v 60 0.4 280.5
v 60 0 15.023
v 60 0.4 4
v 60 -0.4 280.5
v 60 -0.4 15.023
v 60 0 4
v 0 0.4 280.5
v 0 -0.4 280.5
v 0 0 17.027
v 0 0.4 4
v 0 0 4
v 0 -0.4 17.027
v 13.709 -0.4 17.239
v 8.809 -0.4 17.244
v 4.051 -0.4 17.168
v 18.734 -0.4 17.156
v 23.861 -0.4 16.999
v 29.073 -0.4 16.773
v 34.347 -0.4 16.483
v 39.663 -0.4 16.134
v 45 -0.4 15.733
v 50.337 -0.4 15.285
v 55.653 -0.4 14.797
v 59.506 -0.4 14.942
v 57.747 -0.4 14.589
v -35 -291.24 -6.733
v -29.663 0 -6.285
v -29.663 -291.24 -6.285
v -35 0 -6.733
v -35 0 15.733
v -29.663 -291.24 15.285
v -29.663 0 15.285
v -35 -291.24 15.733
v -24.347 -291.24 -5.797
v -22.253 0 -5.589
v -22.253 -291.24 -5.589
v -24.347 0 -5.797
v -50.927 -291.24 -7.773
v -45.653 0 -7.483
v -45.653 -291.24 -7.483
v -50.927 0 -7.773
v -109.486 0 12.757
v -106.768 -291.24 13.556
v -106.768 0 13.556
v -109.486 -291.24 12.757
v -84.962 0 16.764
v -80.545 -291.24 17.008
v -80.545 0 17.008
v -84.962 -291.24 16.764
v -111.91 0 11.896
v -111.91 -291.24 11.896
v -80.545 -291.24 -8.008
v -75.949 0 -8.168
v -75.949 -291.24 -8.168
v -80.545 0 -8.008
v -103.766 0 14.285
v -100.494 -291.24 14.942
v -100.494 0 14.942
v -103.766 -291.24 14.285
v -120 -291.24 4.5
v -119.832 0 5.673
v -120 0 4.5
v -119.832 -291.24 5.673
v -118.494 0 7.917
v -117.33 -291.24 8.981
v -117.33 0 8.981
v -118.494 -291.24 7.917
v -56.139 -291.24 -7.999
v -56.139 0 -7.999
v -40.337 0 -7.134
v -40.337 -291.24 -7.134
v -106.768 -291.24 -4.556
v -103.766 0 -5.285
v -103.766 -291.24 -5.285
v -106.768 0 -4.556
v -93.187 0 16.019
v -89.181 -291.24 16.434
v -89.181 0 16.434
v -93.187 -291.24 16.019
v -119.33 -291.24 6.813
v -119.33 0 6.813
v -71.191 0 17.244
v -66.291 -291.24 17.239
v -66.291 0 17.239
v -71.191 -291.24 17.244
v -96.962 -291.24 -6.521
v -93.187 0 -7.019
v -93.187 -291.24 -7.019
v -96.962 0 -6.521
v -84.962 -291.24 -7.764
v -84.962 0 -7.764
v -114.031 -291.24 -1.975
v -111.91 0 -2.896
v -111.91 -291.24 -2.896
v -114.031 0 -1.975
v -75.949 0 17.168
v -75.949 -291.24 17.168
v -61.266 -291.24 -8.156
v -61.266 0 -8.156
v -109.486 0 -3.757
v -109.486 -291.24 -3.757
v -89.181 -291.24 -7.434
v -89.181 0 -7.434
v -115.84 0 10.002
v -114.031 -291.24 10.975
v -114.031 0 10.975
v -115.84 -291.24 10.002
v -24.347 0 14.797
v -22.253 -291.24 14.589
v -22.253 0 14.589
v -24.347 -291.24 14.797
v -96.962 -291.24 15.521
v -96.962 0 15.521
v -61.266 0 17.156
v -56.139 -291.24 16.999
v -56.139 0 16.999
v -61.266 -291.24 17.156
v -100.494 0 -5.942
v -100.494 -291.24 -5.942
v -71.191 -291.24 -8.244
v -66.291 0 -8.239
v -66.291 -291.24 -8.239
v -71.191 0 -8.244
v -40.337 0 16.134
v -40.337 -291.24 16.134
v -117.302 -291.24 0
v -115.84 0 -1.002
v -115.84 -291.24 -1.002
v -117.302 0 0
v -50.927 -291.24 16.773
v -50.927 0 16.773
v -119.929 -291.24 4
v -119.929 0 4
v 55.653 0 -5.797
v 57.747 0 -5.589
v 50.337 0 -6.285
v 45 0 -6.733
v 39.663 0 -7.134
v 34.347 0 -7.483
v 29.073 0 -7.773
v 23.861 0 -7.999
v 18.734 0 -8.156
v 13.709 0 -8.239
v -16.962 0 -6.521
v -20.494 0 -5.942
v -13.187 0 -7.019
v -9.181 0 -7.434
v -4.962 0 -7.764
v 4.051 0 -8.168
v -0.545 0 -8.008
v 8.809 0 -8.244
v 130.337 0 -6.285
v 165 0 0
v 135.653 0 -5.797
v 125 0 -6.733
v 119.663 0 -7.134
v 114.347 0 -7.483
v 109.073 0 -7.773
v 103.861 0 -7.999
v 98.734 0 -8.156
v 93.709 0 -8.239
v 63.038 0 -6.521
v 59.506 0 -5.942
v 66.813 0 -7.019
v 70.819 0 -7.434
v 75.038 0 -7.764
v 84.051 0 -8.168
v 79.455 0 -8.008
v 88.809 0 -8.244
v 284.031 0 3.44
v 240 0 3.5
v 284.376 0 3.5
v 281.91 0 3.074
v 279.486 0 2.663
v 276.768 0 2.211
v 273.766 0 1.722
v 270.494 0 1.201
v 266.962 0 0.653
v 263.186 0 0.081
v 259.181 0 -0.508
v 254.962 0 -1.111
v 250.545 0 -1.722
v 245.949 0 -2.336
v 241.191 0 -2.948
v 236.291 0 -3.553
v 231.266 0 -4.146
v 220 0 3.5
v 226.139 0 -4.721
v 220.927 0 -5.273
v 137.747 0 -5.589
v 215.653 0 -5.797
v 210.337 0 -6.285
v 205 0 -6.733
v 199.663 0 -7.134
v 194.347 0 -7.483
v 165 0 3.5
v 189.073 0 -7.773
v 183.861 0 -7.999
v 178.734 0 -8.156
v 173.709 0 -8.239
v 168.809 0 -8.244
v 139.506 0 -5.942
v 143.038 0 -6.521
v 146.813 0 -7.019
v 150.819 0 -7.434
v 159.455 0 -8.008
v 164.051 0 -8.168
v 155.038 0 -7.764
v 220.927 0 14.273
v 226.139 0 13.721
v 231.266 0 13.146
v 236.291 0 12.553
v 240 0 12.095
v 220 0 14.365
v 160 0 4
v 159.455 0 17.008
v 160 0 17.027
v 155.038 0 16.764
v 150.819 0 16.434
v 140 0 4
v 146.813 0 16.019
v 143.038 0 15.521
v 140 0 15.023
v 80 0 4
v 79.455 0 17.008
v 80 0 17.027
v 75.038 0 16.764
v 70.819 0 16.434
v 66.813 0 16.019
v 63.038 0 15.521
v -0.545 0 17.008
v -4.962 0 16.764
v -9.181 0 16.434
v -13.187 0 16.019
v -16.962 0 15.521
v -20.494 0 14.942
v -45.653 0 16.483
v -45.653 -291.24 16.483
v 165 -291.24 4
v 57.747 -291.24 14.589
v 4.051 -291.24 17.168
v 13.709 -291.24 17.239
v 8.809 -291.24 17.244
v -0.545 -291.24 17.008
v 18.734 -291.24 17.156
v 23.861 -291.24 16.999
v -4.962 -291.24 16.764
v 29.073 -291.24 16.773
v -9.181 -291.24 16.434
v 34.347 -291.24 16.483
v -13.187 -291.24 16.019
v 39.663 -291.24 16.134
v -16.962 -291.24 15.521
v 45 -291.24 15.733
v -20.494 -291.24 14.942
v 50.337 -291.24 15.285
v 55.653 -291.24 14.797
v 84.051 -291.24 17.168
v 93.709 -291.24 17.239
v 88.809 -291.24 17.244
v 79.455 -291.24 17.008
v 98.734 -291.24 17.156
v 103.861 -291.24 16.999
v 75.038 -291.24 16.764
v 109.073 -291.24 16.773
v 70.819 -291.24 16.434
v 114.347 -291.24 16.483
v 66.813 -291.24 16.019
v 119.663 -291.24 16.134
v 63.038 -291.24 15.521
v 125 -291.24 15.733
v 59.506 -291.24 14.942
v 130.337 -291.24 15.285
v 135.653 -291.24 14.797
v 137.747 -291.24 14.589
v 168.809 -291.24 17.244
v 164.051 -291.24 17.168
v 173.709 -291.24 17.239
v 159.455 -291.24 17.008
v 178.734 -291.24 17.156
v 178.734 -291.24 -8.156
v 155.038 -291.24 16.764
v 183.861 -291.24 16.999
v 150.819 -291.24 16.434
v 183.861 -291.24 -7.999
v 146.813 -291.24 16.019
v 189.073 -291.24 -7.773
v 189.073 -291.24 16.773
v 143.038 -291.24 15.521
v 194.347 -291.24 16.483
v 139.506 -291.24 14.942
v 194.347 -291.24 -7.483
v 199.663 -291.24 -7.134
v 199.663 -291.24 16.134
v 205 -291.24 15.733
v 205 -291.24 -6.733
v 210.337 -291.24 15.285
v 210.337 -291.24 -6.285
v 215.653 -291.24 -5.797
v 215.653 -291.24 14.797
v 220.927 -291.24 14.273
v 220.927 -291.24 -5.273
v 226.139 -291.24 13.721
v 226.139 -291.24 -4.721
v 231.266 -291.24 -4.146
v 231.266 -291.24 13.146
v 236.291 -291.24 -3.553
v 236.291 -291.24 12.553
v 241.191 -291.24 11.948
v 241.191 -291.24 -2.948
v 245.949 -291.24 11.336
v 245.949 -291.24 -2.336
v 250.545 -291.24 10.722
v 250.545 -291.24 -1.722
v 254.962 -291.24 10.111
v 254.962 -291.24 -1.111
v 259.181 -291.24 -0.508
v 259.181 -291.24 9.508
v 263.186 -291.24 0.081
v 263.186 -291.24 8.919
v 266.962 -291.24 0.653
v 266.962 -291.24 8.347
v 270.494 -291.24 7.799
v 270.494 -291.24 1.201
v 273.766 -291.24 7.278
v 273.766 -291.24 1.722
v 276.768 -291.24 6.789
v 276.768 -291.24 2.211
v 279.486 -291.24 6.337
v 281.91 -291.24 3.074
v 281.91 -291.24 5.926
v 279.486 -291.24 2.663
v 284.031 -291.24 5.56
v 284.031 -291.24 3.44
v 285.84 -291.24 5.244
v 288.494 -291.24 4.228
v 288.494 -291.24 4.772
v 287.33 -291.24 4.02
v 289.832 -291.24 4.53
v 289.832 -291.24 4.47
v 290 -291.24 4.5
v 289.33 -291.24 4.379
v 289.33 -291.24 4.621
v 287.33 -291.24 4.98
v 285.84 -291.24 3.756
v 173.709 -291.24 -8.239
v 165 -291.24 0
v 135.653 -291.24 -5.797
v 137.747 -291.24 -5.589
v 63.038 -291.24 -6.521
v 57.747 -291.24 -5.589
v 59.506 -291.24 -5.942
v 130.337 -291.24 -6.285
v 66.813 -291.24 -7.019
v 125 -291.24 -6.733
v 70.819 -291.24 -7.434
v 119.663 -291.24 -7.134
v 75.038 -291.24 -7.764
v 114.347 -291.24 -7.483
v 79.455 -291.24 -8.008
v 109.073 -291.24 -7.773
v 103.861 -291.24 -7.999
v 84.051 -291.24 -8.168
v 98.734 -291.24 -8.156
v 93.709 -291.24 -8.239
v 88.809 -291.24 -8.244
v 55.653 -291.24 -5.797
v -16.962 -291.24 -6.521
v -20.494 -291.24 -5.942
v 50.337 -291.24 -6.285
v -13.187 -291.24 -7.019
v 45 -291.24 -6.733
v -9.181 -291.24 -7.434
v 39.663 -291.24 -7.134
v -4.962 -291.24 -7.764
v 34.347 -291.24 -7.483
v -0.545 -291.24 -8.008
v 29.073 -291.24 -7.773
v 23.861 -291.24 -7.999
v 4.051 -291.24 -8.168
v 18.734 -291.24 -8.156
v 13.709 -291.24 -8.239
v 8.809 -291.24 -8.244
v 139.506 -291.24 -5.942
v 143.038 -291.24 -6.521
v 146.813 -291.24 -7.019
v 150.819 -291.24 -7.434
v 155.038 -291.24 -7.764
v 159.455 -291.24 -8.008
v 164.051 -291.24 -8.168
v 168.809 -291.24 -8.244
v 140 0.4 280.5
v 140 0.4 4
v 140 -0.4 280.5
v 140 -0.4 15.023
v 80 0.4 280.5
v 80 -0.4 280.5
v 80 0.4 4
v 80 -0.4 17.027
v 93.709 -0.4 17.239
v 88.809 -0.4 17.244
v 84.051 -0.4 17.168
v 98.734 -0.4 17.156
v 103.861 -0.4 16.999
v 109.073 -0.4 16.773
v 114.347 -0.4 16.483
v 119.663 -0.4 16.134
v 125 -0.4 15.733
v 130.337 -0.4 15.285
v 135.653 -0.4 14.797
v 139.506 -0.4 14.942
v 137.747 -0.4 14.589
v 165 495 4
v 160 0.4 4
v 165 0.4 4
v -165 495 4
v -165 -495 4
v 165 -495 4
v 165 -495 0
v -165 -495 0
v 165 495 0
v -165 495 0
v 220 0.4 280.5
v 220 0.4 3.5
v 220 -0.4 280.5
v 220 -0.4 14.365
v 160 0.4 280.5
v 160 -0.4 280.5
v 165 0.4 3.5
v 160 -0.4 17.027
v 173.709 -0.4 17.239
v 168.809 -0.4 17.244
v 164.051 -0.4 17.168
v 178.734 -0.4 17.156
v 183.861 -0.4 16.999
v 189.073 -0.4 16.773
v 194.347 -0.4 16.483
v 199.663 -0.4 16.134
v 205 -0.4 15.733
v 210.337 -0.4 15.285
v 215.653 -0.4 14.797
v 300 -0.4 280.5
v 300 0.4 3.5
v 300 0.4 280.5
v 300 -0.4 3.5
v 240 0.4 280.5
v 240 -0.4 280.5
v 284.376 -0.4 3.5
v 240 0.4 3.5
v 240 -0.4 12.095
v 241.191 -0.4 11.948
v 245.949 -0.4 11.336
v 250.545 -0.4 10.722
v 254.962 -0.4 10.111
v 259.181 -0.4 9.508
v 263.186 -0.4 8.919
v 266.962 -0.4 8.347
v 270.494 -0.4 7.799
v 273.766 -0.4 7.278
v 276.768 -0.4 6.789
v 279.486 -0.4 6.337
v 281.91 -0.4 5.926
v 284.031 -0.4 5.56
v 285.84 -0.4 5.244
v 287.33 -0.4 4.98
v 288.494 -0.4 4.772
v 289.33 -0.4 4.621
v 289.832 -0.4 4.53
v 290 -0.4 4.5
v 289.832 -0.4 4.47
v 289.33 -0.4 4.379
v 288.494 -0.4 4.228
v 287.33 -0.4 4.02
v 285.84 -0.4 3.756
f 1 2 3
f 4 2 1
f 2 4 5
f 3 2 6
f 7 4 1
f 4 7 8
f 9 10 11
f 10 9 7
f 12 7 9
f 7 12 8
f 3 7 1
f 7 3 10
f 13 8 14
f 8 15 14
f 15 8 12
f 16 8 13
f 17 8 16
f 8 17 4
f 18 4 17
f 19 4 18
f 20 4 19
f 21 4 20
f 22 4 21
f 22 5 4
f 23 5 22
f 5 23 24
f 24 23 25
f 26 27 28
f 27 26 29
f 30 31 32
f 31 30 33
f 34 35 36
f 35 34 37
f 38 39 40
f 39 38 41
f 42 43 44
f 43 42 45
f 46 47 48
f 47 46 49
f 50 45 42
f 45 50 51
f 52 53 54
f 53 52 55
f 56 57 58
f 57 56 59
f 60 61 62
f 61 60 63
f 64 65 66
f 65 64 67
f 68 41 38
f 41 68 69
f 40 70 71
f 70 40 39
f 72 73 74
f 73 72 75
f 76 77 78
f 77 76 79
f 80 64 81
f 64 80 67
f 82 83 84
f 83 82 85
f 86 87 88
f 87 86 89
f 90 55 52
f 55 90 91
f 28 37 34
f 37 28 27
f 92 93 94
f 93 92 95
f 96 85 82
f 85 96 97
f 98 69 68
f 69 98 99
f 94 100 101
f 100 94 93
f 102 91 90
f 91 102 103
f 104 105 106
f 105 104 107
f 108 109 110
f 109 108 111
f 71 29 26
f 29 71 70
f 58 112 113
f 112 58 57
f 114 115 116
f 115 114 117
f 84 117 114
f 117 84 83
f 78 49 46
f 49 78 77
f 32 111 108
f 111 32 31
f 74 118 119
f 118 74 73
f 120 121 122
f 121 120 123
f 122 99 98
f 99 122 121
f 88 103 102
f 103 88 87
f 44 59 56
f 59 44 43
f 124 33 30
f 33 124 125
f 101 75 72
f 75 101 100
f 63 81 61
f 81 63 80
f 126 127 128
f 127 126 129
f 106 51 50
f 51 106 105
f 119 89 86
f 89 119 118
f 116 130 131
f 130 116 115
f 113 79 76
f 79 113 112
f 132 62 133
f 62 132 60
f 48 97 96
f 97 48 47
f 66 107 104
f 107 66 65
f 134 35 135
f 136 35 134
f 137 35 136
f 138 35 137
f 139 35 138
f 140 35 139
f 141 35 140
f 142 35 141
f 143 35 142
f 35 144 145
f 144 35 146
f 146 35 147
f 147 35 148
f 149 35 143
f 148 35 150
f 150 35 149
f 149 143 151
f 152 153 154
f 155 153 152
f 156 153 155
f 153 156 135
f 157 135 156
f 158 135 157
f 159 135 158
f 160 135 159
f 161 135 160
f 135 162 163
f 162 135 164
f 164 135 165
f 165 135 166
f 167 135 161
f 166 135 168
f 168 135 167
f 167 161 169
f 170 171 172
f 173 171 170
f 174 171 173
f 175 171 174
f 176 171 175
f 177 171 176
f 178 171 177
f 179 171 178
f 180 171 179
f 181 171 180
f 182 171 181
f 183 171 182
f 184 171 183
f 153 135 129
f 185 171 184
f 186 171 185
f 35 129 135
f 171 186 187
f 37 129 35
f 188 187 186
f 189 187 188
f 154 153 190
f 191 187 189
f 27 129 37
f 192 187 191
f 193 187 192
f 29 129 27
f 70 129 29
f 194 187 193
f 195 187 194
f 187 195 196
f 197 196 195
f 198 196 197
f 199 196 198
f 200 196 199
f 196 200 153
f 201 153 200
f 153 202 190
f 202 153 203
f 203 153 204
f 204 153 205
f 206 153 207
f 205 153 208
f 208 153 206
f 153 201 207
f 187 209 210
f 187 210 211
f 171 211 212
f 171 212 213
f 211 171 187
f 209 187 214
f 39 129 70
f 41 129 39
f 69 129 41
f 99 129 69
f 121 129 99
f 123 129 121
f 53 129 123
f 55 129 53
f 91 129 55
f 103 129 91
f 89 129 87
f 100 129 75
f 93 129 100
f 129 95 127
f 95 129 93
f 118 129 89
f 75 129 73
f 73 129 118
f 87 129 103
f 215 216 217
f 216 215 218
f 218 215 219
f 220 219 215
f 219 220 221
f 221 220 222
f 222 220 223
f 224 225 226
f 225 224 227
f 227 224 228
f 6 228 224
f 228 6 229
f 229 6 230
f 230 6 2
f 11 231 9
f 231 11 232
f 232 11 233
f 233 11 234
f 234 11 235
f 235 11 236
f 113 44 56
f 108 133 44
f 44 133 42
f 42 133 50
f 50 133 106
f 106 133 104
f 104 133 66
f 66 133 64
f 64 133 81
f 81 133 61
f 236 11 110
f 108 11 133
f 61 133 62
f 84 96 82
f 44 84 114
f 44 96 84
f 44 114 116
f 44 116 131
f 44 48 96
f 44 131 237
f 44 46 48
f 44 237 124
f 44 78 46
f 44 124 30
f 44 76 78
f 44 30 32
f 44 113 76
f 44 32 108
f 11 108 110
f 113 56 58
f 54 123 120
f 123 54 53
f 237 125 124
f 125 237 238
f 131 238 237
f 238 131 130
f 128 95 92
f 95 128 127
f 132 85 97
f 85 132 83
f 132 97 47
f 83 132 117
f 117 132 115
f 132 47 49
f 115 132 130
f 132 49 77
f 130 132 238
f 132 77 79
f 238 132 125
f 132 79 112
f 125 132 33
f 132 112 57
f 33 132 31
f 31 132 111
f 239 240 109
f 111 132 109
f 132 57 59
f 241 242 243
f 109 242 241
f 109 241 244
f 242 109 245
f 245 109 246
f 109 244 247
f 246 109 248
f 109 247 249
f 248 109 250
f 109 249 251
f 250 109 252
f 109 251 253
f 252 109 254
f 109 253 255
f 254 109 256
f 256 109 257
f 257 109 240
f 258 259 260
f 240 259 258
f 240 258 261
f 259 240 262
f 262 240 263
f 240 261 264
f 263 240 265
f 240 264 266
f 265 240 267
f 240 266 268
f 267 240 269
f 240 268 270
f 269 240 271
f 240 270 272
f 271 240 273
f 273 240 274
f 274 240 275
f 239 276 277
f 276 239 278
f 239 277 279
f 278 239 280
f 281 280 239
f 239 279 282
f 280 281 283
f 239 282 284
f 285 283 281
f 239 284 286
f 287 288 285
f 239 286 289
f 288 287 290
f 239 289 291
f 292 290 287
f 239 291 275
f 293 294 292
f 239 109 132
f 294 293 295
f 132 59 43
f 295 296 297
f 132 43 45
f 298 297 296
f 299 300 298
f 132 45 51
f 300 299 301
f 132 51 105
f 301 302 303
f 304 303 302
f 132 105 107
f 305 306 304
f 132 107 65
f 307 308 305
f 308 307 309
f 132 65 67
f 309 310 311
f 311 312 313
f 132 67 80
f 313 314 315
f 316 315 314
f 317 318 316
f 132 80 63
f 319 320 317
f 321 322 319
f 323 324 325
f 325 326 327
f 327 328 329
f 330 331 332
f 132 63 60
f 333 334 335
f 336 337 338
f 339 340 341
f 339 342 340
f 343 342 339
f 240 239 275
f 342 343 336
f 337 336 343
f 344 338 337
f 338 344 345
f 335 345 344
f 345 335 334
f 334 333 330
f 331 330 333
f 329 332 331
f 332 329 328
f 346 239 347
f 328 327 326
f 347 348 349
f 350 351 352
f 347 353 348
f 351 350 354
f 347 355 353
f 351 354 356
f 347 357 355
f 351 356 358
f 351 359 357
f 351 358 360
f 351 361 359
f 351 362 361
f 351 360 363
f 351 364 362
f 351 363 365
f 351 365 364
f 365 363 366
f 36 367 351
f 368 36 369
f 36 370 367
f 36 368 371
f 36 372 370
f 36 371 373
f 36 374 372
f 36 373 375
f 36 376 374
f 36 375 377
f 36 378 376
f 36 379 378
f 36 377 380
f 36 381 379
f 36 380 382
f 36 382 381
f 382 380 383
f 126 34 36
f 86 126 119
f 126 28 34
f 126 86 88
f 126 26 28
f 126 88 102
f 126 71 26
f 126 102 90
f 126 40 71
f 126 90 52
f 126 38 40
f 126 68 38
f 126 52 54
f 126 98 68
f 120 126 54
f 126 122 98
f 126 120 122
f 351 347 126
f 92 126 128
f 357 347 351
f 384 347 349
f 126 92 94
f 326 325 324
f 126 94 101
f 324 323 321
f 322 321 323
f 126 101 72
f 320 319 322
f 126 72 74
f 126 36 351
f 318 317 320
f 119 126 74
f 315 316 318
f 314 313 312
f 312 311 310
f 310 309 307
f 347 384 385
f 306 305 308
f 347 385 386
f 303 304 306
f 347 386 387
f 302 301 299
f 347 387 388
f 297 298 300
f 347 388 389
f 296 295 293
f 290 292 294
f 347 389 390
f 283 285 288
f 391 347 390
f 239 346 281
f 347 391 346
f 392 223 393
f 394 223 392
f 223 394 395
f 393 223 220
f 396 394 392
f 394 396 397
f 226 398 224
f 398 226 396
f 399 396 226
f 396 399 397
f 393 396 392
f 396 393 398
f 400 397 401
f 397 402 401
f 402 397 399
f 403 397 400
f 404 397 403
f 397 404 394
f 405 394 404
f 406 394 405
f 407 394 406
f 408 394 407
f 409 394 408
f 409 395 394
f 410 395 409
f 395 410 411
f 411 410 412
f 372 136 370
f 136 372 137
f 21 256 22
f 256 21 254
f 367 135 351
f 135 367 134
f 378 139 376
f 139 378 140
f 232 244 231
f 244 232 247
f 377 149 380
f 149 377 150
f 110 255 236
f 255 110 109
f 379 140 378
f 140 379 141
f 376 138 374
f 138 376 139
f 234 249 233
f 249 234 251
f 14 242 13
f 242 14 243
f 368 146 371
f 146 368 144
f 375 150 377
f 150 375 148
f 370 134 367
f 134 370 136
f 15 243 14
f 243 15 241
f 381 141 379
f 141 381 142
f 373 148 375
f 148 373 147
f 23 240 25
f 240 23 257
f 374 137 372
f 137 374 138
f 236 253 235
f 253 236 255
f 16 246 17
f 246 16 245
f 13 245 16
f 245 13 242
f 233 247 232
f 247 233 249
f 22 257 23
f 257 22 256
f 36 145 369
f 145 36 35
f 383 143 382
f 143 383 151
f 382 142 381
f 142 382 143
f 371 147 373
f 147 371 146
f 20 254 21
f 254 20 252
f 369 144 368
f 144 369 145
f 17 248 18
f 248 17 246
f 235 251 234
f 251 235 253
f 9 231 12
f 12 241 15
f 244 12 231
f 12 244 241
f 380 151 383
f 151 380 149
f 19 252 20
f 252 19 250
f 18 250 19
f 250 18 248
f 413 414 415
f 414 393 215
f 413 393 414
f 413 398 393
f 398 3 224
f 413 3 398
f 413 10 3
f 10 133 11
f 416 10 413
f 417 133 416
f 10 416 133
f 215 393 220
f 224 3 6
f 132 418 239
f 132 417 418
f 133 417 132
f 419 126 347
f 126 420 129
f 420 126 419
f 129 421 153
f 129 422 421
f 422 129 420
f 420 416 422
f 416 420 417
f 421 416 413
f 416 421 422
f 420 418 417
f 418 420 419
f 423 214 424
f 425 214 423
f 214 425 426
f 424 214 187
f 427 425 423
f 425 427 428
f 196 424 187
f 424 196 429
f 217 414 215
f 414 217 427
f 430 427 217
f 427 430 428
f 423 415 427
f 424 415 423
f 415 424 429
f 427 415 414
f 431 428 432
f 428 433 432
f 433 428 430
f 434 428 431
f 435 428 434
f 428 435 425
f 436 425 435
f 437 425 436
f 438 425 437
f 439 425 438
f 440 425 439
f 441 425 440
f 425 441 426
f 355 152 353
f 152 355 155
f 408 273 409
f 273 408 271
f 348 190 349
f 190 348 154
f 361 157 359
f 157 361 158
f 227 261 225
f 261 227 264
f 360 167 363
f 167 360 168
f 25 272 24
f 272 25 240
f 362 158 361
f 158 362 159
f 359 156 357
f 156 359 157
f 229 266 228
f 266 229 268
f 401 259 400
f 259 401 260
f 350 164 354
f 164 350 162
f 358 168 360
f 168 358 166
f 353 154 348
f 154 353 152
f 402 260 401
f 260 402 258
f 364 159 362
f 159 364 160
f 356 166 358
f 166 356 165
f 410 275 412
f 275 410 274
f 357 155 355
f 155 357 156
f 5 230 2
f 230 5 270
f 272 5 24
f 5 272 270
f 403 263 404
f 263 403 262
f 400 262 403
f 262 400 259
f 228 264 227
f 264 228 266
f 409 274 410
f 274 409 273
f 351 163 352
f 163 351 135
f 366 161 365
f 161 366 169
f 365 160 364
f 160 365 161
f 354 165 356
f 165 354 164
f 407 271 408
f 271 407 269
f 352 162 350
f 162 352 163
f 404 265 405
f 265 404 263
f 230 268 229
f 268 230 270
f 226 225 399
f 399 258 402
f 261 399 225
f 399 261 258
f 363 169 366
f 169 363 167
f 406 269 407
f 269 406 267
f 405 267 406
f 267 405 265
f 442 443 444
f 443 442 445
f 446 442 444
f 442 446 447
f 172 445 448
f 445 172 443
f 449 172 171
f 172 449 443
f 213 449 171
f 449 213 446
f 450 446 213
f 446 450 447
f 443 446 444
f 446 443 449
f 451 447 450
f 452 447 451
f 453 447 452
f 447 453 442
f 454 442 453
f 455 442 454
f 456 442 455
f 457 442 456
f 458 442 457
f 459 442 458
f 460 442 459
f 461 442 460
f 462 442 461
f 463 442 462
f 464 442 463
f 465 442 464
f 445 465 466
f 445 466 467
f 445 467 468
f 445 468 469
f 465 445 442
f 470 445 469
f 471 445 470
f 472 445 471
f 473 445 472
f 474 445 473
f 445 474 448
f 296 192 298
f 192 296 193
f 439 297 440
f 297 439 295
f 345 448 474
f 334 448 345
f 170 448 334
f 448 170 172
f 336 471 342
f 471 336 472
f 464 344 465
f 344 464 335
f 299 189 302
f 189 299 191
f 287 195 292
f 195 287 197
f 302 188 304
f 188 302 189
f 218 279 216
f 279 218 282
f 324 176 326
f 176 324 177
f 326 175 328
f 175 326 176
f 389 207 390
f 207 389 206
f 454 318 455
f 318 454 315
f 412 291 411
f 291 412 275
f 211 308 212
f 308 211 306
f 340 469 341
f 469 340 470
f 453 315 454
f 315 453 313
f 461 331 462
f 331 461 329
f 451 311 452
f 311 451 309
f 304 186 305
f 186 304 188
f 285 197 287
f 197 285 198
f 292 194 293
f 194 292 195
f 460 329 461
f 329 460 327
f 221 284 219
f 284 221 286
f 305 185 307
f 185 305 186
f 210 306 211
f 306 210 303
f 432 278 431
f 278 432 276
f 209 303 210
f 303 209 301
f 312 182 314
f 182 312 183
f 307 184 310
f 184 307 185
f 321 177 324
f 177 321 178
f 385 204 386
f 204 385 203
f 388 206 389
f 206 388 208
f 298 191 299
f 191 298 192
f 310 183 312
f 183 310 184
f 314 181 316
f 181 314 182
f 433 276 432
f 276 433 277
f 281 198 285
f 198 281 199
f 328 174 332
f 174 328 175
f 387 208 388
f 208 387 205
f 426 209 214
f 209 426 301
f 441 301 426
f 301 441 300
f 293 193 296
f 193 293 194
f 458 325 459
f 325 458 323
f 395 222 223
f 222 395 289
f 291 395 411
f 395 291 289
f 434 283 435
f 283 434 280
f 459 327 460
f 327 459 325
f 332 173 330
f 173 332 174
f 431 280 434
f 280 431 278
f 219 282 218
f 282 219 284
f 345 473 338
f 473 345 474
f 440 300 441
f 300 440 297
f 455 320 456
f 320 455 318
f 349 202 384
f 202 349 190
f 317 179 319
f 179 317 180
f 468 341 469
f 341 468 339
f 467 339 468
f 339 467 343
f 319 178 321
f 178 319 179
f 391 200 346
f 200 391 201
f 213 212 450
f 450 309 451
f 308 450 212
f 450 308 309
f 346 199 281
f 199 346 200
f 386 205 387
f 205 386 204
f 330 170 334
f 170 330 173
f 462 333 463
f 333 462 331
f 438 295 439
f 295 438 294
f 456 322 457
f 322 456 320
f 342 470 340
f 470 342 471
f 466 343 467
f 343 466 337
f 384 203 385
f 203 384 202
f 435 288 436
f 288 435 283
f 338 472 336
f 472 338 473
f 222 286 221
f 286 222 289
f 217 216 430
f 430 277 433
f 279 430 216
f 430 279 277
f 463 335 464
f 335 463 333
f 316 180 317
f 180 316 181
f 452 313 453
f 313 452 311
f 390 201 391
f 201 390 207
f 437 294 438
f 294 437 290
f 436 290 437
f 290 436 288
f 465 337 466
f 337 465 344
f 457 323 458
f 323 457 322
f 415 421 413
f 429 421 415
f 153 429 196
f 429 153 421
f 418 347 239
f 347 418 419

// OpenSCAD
// file: ../666_1032.scad
draft = true;   // sets rendering quality to draft.
$fs = draft ? 5 : 0.5;
$fa = 10;

module 666_1032(draft){

    airfoil_thickness = 0030;
    depth = main_tube_outer_diameter*2;
    width = main_tube_outer_diameter + 2*(main_tube_outer_diameter/10);
    height = depth;

    beta = 90 - trailing_edge_angle(naca = airfoil_thickness); // calculate the angle of trailing edge
    trailing_wall= 1/(cos(beta)); //calculate lenght of wall cut relative to wall thickness
    echo(trailing_wall); // print a relative thickness of material at traling edge to wall thickness. 

    difference (){
union(){

    difference(){
    	airfoil(naca = airfoil_thickness, L = 170, N=101, h = height_of_vertical_tube + main_tube_outer_diameter/2 + 2*global_clearance + coupling_wall_thickness, open = false);
    	translate ([hull_wall_thickness,0,45])
            resize([170 - hull_wall_thickness - trailing_wall*hull_wall_thickness,(170*airfoil_thickness/100)- 2*hull_wall_thickness,210], auto=true) 
                airfoil(naca = airfoil_thickness, L = 170, N=101, h = height_of_vertical_tube + main_tube_outer_diameter/2 + 2*global_clearance, open = false);
    }
    //lem spodní a horní díl
    intersection(){
        difference(){
            union(){
                translate([0,-75,cover_pilon_division[1] - hull_wall_thickness])
                        cube([190,150,hull_wall_thickness]);
                translate([0,-75,cover_pilon_division[1]])
                        cube([190,150,hull_wall_thickness]);
        }

        translate ([ribbon_width,0,45])
            resize([170 - ribbon_width - trailing_wall*ribbon_width,(170*airfoil_thickness/100)- 2*ribbon_width,210], auto=true) 
                airfoil(naca = airfoil_thickness, L = 170, N=101, h = height_of_vertical_tube + main_tube_outer_diameter/2 + 2*global_clearance, open = false);
    //difference
    }
        airfoil(naca = airfoil_thickness, L = 170, N=101, h = height_of_vertical_tube + main_tube_outer_diameter/2 + 2*global_clearance + coupling_wall_thickness, open = false);
}
}
    	//pro otevření
    	translate ([120,- hull_wall_thickness/2,- 2*global_clearance])
    	   cube ([60,hull_wall_thickness,height_of_vertical_tube + 4*global_clearance]);

    	translate ([main_tube_outer_diameter + coupling_wall_thickness*2,-depth/2 - global_clearance,height_of_vertical_tube - main_tube_outer_diameter*2 - global_clearance/2 + main_tube_outer_diameter/2 + coupling_wall_thickness])
    	   cube ([width*5,depth + 2*global_clearance,height+global_clearance + main_tube_outer_diameter]);

        // hull shell from 666_1025.scad
        translate ([- cover_pilon_position,0,0])
            rotate ([90,0,0])
                drop(draft);
    //final difference
    }
//final module
}


//pro tisk

module 666_1032_A(draft){
        intersection(){
                666_1032(draft);
            translate([0,- 75,0])
                cube([180,150,cover_pilon_division[1]]);
        }
}

module 666_1032_B(draft){
    translate([0,0,20])
        intersection(){
                666_1032(draft);
            translate([0,- 75,cover_pilon_division[1]])
                cube([180,150,cover_pilon_division[2] - cover_pilon_division[1]]);
        }
}

//666_1032(draft);
666_1032_A(draft);
666_1032_B(draft);

use <./lib/naca4.scad>
include <../Parameters.scad>
use <666_1025.scad>
use <888_1000.scad>
// file: ../888_1000.scad
/*
// Nastavení zobrazení
$vpr = [338, 0, 357];
$vpt = [180, 25, -18];
$vpd = 1280;
*/
//improving rendering speed.
draft = true;   // sets rendering quality to draft.
$fs = draft ? 5 : 0.5;
$fa = 10;

/*
TODO: 

Přední díl obsahuje převis ve směru vybrání pro držák motoru. (U horního zámku)
Otvory pro šrouby v předním dílu jsou oválné, protože nejsou kolmo k rovině modelu.


*/




//vnitřní kapka
module hollowing_skeleton(shell_thickness = hull_wall_thickness, draft)
{

    beta = 90 - trailing_edge_angle(naca = hull_airfoil_thickness); // calculate the angle of trailing edge
    trailing_wall= 1/(cos(beta)); //calculate lenght of wall cut relative to wall thickness 

    intersection () {
    resize([hull_drop_length - shell_thickness - trailing_wall* shell_thickness, (hull_drop_length*hull_airfoil_thickness/100) - 2*shell_thickness, (hull_drop_length*hull_airfoil_thickness/100) - 2*shell_thickness], auto=true)
            rotate ([0,90,0])           
            rotate_extrude($fn = draft ? 50 : 100)
                rotate([0,0,90])
                    difference()
                    {
                      polygon(points = airfoil_data(naca=hull_airfoil_thickness, L = hull_drop_length, N=draft ? 50 : 200)); 
                      square(hull_drop_length); 
                    }
                    
      translate([0,0,hull_corner_radius])
        minkowski(){                   
            translate ([0,- hull_y_size , - hull_z_size/2 + shell_thickness])
                cube ([hull_x_size,2*hull_y_size - shell_thickness, hull_z_size - 2*shell_thickness - 2*hull_corner_radius]);
                rotate ([0,90,0])
                    cylinder (h = 1, r = hull_corner_radius, $fn = draft ? 50 : 100);                   
          }
                            
    }
}

module hollowing_skeleton_hem(ribbon_width, draft)
{

    beta = 90 - trailing_edge_angle(naca = hull_airfoil_thickness); // calculate the angle of trailing edge
    trailing_wall= 1/(cos(beta)); //calculate lenght of wall cut relative to wall thickness 

    intersection () {
    resize([hull_drop_length - ribbon_width - trailing_wall* ribbon_width, (hull_drop_length*hull_airfoil_thickness/100) - 2*ribbon_width, (hull_drop_length*hull_airfoil_thickness/100) - 2*ribbon_width], auto=true)
            rotate ([0,90,0])           
            rotate_extrude($fn = draft ? 50 : 100)
                rotate([0,0,90])
                    difference()
                    {
                      polygon(points = airfoil_data(naca=hull_airfoil_thickness, L = hull_drop_length, N=draft ? 50 : 200)); 
                      square(hull_drop_length); 
                    }
                    
      translate([0,0,hull_corner_radius])
        minkowski(){                   
            translate ([0,- hull_y_size, - hull_z_size/2 + ribbon_width])
                cube ([hull_x_size,2*hull_y_size - ribbon_width, hull_z_size - 2*ribbon_width - 2*hull_corner_radius]);
                rotate ([0,90,0])
                    cylinder (h = 1, r = hull_corner_radius, $fn = draft ? 50 : 100);                   
          }
                            
    }
}




//celá kapka
module drop(draft = true)
{

    beta = 90 - trailing_edge_angle(naca = hull_airfoil_thickness); // calculate the angle of trailing edge
    trailing_wall= 1/(cos(beta)); //calculate lenght of wall cut relative to wall thickness 

	intersection () {
    	rotate ([0,90,0])           
        	rotate_extrude($fn = draft ? 50 : 100)
                    rotate([0,0,90])
                        difference()
                        {
	                        polygon(points = airfoil_data(naca=hull_airfoil_thickness, L =hull_drop_length , N=draft ? 50 : 200)); 
    	                    square(hull_drop_length); 
        	            }
            		
        translate([0,0,hull_corner_radius])
          	minkowski(){                   
             	translate ([0,-hull_y_size,-hull_z_size/2])
             			cube ([hull_x_size, 2*hull_y_size,hull_z_size-2*hull_corner_radius]);
             	  	rotate ([0,90,0])
                 		cylinder (h = 1, r = hull_corner_radius, $fn = draft ? 50 : 100);                   
		    }
		    
	}
}


//základní kapka
module drop_skin(draft){

	difference(){
			drop();
		translate([hull_wall_thickness,0,0])
			hollowing_skeleton();
	}

}




drop_skin();














use <./lib/naca4.scad>
include <../Parameters.scad>
// file: ../666_1025.scad
use <./lib/naca4.scad>
include <../Parameters.scad>
use <666_1032.scad>


//Jen pro názornost
	//translate([180,0,0])
		//rotate ([-90,0,0])
			//666_1032();





module 666_1025(){

    beta = 90 - trailing_edge_angle(naca = hull_airfoil_thickness); // calculate the angle of trailing edge
    trailing_wall= 1/(cos(beta)); //calculate lenght of wall cut relative to wall thickness
    echo(trailing_wall); // print a relative thickness of material at traling edge to wall thickness.    

    difference(){
        intersection () {
            union(){
        		rotate ([0,90,0])           
                    rotate_extrude($fn = 100)
                        rotate([0,0,90])
                            difference()
                            {

                              polygon(points = airfoil_data(naca=hull_airfoil_thickness, L =hull_drop_length , N=100)); 
                              square(hull_drop_length); 
                            }

                // 666_1032 part holder
                translate([180,0,0]) 
                    rotate ([-90,0,0]) 
                        difference(){
                            
                            translate ([hull_wall_thickness,0,0])
                                resize([170 - hull_wall_thickness - trailing_wall*hull_wall_thickness,(170*0030/100)- 2*hull_wall_thickness,210], auto=true) 
                                    airfoil(naca = 0030, L = 170, N=101, h = 200, open = false);
                            translate ([2*hull_wall_thickness,0,0])       
                                resize([170 - hull_wall_thickness*2 - trailing_wall*hull_wall_thickness*2,(160*0030/100)- 2*hull_wall_thickness,210], auto=true) 
                                    airfoil(naca = 0030, L = 170, N=101, h = 200, open = false);
                            
                        }

            }
            minkowski(){                   
             	translate ([0,-(main_tube_outer_diameter/2)+1,-hull_z_size/2])
             		cube ([hull_x_size, hull_y_size,hull_z_size]);
             	
             		rotate ([0,90,0])
                 		cylinder (h = 1, r = hull_corner_radius, $fn = 100);                   

        	}

        }   

        //hollowing skeleton
    		translate ([hull_wall_thickness,0,0])
            	intersection () {
                    resize([hull_drop_length - hull_wall_thickness - trailing_wall* hull_wall_thickness, (hull_drop_length*hull_airfoil_thickness/100) - 2*hull_wall_thickness, (hull_drop_length*hull_airfoil_thickness/100) - 2*hull_wall_thickness], auto=true)
                 		rotate ([0,90,0])           
                            rotate_extrude($fn = 100)
                                rotate([0,0,90])
                                    difference()
                                    {

                                      polygon(points = airfoil_data(naca=hull_airfoil_thickness, L = hull_drop_length, N=200)); 
                                      square(hull_drop_length); 
                                    }
                 	minkowski(){                   
                     	translate ([0,-(main_tube_outer_diameter/2),-hull_z_size/2 + hull_wall_thickness])
                     		cube ([hull_x_size,hull_y_size - hull_wall_thickness, hull_z_size - 2*hull_wall_thickness]);
                     		rotate ([0,90,0])
                         		cylinder (h = 1, r = hull_corner_radius, $fn = 100);                   
            		}                   
            	}
            //for front part
    		translate ([-2,-1 - main_tube_outer_diameter/2,-25])
    				cube ([52,hull_y_size+10,50]);

        //for tube in back
    		translate ([hull_x_size-70,0,0])
    			rotate ([0,90,0])
    				cylinder (h = 80, r1 = main_tube_outer_diameter/2, r2 = main_tube_outer_diameter/2, $fn = 200);
    					    
        //for tube - propeller

			translate ([180+2*hull_wall_thickness,-10,0])       
				rotate ([-90,0,0])
                    resize([170 - hull_wall_thickness*2 - trailing_wall*hull_wall_thickness*2,(160*0030/100)- 2*hull_wall_thickness,210], auto=true) 
                        airfoil(naca = 0030, L = 170, N=101, h = 200, open = false);
        			
        //for printing
    		translate([0,-main_tube_outer_diameter/2-4.90,-170/2])
    			cube ([600,5,170]);

    		translate([hull_x_size-50,-main_tube_outer_diameter,-main_tube_outer_diameter/2])		
    			cube([80,main_tube_outer_diameter, main_tube_outer_diameter]);	

    }


}

    intersection(){
        666_1025();
        translate([0,-20,-150])                        
           cube([150,150,300]);
    }

    translate([20,0,0])
        intersection(){
            666_1025();
            translate([150,-20,-150])
               cube([150,150,300]);
        }

    translate([40,0,0])
        intersection(){
            666_1025();
            translate([300,-20,-150])
               cube([150,150,300]);
        }


    translate([60,0,0])
        intersection(){
            666_1025();
            translate([450,-20,-150])
               cube([150,150,300]);
        }
// file: ../lib/naca4.scad
// Naca4.scad - library for parametric airfoils of 4 digit NACA series
// Code: Rudolf Huttary, Berlin 
// June 2015
// commercial use prohibited


// general use: for more examples refer to sampler.scad
// naca = naca digits or 3el vector  (default = 12 or [0, 0, .12])
// L    = chord length [mm]      (default= 100)
// N    = # sample points        (default= 81)
// h    = height [mm]            (default= 1)
// open = close at the thin end? (default = true)
// two equivalent example calls
 airfoil(naca = 2408, L = 60, N=1001, h = 30, open = false); 
// airfoil(naca = [.2, .4, .32], L = 60, N=1001, h = 30, open = false); 

module help()
{
  echo(str("\n\nList of signatures in lib:\n=================\n", 
  "module airfoil(naca=2412, L = 100, N = 81, h = 1, open = false) - renders airfoil object\n", 
  "module airfoil(naca=[.2, .4, .12], L = 100, N = 81, h = 1, open = false) - renders airfoil object using percentage for camber,  camber distance and thicknes\n", 
  "function airfoil_data(naca=12, L = 100, N = 81, open = false)\n",
  "=================\n")); 
}

help(); 
// this is the object
module airfoil(naca=12, L = 100, N = 81, h = 1, open = false)
{
  linear_extrude(height = h)
  polygon(points = airfoil_data(naca, L, N, open)); 
}

module hollow_airfoil(lnaca=12, L = 100, N = 81, h = 1, open = false, wall_thickness = 1)
{
    if (open){
        linear_extrude(height = h)

        if (wall_thickness>0){
            difference(){
                polygon(points = airfoil_data(naca, L, N, false));
                offset(delta = - wall_thickness, chamfer = false) polygon(points = airfoil_data(naca, L, N, open = false));
            }
        }
        else{
            difference(){
                offset(delta = - wall_thickness, chamfer = false) polygon(points = airfoil_data(naca, L, N, open = false));
                polygon(points = airfoil_data(naca, L, N, false));
            }
        }
    }
    else{

        linear_extrude(height = abs(wall_thickness))
            polygon(points = airfoil_data(naca, L, N, false)); 

        linear_extrude(height = h)
            difference(){
                polygon(points = airfoil_data(naca, L, N, open));
                offset(delta = - wall_thickness) polygon(points = airfoil_data(naca, L, N, open = false));
            }

        translate([0,0, h - wall_thickness])
            linear_extrude(height = abs(wall_thickness))
                polygon(points = airfoil_data(naca, L, N, false)); 

    }
}


// this is the main function providing the airfoil data
function airfoil_data(naca=12, L = 100, N = 81, open = false) = 
  let(Na = len(naca)!=3?NACA(naca):naca)
  let(A = [.2969, -0.126, -.3516, .2843, open?-0.1015:-0.1036])
  [for (b=[-180:360/(N):179.99]) 
    let (x = (1-cos(b))/2)  
    let(yt = sign(b)*Na[2]/.2*(A*[sqrt(x), x, x*x, x*x*x, x*x*x*x])) 
    Na[0]==0?L*[x, yt]:L*camber(x, yt, Na[0], Na[1], sign(b))];  


function trailing_edge_angle(naca=12, open = false) = 
  let(Na = len(naca)!=3?NACA(naca):naca)
  let(A = [.2969, -0.126, -.3516, .2843, open?-0.1015:-0.1036])
  let (x =0.999)  // set x near to airfoil trailing edge
  let(yt = Na[2]/.2*(A*[sqrt(x), x, x*x, x*x*x, x*x*x*x])) // calculate distance from x-axis at previously set position
  atan2(yt,1-x);  // calculate angle of triangle between end of airfoil. The triange height corresponds to previously calculated distance from x-axis

function surface_angle(x = 0.5, naca=12, open = false) = 
  let(Na = len(naca)!=3?NACA(naca):naca)
  let(A = [0.2969, -0.126, -0.3516, 0.2843, open?-0.1015:-0.1036])
  let(dy = Na[2]/0.2*(A*[(1/2)*(1/sqrt(x)), 1, 2*x, 3*x*x, 4*x*x*x])) // calculate derivative of airfoil function at the x point
  atan(dy);  // calculate  the angle from function derivative

function surface_distance(x = 0.5, naca=12, open = false) = 
  let(Na = len(naca)!=3?NACA(naca):naca)
  let(A = [0.2969, -0.126, -0.3516, 0.2843, open?-0.1015:-0.1036])
  Na[2]/.2*(A*[sqrt(x), x, x*x, x*x*x, x*x*x*x]); // calculate distance from x-axis at previously set position

// helper functions
function NACA(naca) = 
  let (M = floor(naca/1000))
  let (P = floor((naca-M*1000)/100)) 
  [M/100, P/10, floor(naca-M*1000-P*100)/100];  

function camber(x, y, M, P, upper) = 
  let(yc = (x<P)?M/P/P*(2*P*x-x*x): M/(1-P)/(1-P)*(1 - 2*P + 2*P*x -x*x))
  let(dy = (x<P)?2*M/P/P*(P-x):2*M/(1-P)/(1-P)*(P-x))
  let(th = atan(dy))
  [upper ? x - y*sin(th):x + y*sin(th), upper ? yc + y*cos(th):yc - y*cos(th)];
// file: rotor_blade_double.scad
include <../../Parameters.scad>
use <../333_1037.scad>

$vpd = 680;

module rotor_blade_double(draft)
{
    draft = false;        
    plywood_thickness = 4;
    core_thickness = 1.0;
    length = 970;       // celková délka polotovaru
    material_width = 70;
    side_margin = 10; 

    x_size = 2*material_width + 3*side_margin;
    y_size = length + 2*side_margin;
    translate([-x_size/2, -y_size/2,0])
        cube([x_size,y_size, plywood_thickness]);

    translate([- material_width/2 - side_margin/2, 0, plywood_thickness + core_thickness/2])
        333_1037(twosided = true, draft = draft);

    translate([material_width/2 + side_margin/2, 0, plywood_thickness + core_thickness/2])
        333_1037(twosided = true, draft = draft);
}

rotor_blade_double();
// file: ../333_1037.scad
draft = true;   // sets rendering quality to draft.
$fs = draft ? 5 : 0.5;
$fa = 10;

module 333_1037(draft){

    airfoil_thickness = 0015;
    airfoil_depth = main_tube_outer_diameter*2;
    lenght = 970;


    difference (){
        %cube ([970,70,3.86*2], center = true);

    	translate ([120,- hull_wall_thickness/2,- 2*global_clearance])
            cube ([60,hull_wall_thickness,height_of_vertical_tube + 4*global_clearance]);
    }

    //translate ([120,- hull_wall_thickness/2,- 2*global_clearance])
    rotate([90,0,0])
        airfoil(naca = airfoil_thickness, L = 170, N = draft ? 50 : 100, h = height_of_vertical_tube + main_tube_outer_diameter/2 + 2*global_clearance + thickness_between_tubes, open = false);

}



333_1037(draft);

use <./lib/naca4.scad>
include <../Parameters.scad>
use <666_1025.scad>
use <888_1000.scad>
// file: ../../Parameters.scad
//Main tube diameter - hole [mm]
main_tube_outer_diameter = 25.4;
main_tube_inner_diameter = 23.5;

//Tube for undercarriage - hole [mm]
tube_for_undercarriage_outer_diameter = 10.6;
tube_for_undercarriage_inner_diameter = 6;
global_clearance = 0.5;


//umístění podvozkových trubek

second_undercarriage_hole = main_tube_outer_diameter*2 + main_tube_outer_diameter/5 + main_tube_outer_diameter/2 + 170 + 160;

// Parameters of cube couplings
coupling_wall_thickness = main_tube_outer_diameter/5;  //width of coupling walls 
thickness_between_tubes = main_tube_outer_diameter/10;    // minimum distance between tubes in couplings

coupling_wall_thickness_undercarriage = tube_for_undercarriage_outer_diameter/3;
thickness_between_tubes_undercarriage = tube_for_undercarriage_outer_diameter/10;

//Screw diameter and nut for M4 [mm]
M4_screw_diameter=4.5;
Nut_height_M4 = 3.2;
Nut_diameter_M4 = 7.86;


//Screw diameter and nut for M3 [mm]
M3_screw_diameter = 3.2;
Nut_height_M3 = 1.7;	
Nut_diameter_M3 = 6.6; 


//The tube for help
Help_main_tube_outer = 25;
Help_main_tube_inner = 23; 
Help_tube_for_undercarriage_outer = 10;
Help_tube_for_undercarriage_inner = 5;


//main hull parameters

hull_drop_length = 580;
hull_wall_thickness = 0.8;
hull_y_size = 120;
hull_z_size = 150;
hull_x_size = 580;
hull_corner_radius = 4;
hull_airfoil_thickness= 35;  // thickness of drop generating airfoil in percent of lenght.
hull_scale_x = 1;
hull_scale_y = 1.5;
hull_scale_z = 1.5;

main_pilon_position = 170+68;
cover_pilon_position = 180;
height_of_vertical_tube = 275; //278mm je změřená délka trubky. 

ribbon_width = 5; // šířka vyztužovacích lemů. 

// šířka otvoru v přední části kapoty pro držák motoru.
width_of_engine_holder = 63;

//Top Cover Division - dělení horního krytu pro tisk
top_cover_division = [0, 50, 150, 280, 410, hull_x_size]; // upraveny seznam tak, aby deleni začinalo od nuly, což umožňí úplně automatické rozdělení.

//Bottom Cover Division - dělení dolního krytu pro tisk
bottom_cover_division = [0,100,250,365, 470, hull_x_size];
// zkrácená část pro payload pro testovací tisk
//bottom_cover_division = [0,200,250,365, 470, hull_x_size];

//Base Divison - dělení podložky
base_division = [0,140,280,410, hull_x_size];

//Cover pilon division - na výšku (v ose Z)
cover_pilon_division = [0,170,height_of_vertical_tube + main_tube_outer_diameter + coupling_wall_thickness];

//pozice šroubů
	//horní kryt
top_screw_position = [0, (top_cover_division[0] + top_cover_division[1])/4, (top_cover_division[2] - top_cover_division[1])/2 + top_cover_division[1], (top_cover_division[3] - top_cover_division[2])/2 + top_cover_division[2],(top_cover_division[4] - top_cover_division[3])/2 + top_cover_division[3],(top_cover_division[5] - top_cover_division[4])/2 + top_cover_division[4] - 20];
	//spodní kryt
bottom_screw_position = [0,(bottom_cover_division[0] + bottom_cover_division[1])/15 + 5, bottom_cover_division[1]/1.1, + bottom_cover_division[3], bottom_cover_division[3] + bottom_cover_division[1]/2, bottom_cover_division[4] - 6*global_clearance, bottom_cover_division[4] + bottom_cover_division[1]/2.5];




//šířka zámků
lock_width = 10;

//délka zámků
lock_length = 3;


//accumulator
//základní rozměry akumulátoru
width_of_accumulator = 129.4;//45+1;
depth_of_accumulator = 40.61;
height_of_accumulator = 43.65;
//Zapuštění akumulátoru
sink_of_accumulator = 5; //main_tube_outer_diameter/5 - Nut_height_M3*1.5;

//tloušťka hrany spojky
accumulator_holder_width = 18; 
accumulator_holder_thickness = 10; 

//posunutí akumálátoru na podložce
move_of_accumulator = 165;   // pozice akumulátoru (ovlivňuje těžiště)


////////////////
// Senzory
///////////////////

//opticalFlow
    width_optical_flow_senzor = 45.5;
    depth_optical_flow_senzor = 6;
    height_optical_flow_senzor = 35;
    sink_of_optical_flow_senzor = depth_optical_flow_senzor - 5; 
    M3_optical_flow_senzor_Z = 30.4;
    M3_optical_flow_senzor_X = 24;
    M3_optical_flow_senzor_Z_alone = 9.1;
    M3_optical_flow_senzor_X_alone = 16.7;
// main file
include <../../Parameters.scad>
use <../333_1037.scad>

use <rotor_blade_double.scad>

$vpd = 680;

    draft = false;        
    plywood_thickness = 4;
    core_thickness = 1.0;
    length = 970;       // celková délka polotovaru
    material_width = 70;
    side_margin = 10; 

    x_size = 2*material_width + 3*side_margin;
    y_size = length + 2*side_margin;

    translate([- x_size/2 + side_margin/2, 0, 0])
        rotor_blade_double();

    translate([x_size/2 - side_margin/2, 0, 0])
        rotor_blade_double();
